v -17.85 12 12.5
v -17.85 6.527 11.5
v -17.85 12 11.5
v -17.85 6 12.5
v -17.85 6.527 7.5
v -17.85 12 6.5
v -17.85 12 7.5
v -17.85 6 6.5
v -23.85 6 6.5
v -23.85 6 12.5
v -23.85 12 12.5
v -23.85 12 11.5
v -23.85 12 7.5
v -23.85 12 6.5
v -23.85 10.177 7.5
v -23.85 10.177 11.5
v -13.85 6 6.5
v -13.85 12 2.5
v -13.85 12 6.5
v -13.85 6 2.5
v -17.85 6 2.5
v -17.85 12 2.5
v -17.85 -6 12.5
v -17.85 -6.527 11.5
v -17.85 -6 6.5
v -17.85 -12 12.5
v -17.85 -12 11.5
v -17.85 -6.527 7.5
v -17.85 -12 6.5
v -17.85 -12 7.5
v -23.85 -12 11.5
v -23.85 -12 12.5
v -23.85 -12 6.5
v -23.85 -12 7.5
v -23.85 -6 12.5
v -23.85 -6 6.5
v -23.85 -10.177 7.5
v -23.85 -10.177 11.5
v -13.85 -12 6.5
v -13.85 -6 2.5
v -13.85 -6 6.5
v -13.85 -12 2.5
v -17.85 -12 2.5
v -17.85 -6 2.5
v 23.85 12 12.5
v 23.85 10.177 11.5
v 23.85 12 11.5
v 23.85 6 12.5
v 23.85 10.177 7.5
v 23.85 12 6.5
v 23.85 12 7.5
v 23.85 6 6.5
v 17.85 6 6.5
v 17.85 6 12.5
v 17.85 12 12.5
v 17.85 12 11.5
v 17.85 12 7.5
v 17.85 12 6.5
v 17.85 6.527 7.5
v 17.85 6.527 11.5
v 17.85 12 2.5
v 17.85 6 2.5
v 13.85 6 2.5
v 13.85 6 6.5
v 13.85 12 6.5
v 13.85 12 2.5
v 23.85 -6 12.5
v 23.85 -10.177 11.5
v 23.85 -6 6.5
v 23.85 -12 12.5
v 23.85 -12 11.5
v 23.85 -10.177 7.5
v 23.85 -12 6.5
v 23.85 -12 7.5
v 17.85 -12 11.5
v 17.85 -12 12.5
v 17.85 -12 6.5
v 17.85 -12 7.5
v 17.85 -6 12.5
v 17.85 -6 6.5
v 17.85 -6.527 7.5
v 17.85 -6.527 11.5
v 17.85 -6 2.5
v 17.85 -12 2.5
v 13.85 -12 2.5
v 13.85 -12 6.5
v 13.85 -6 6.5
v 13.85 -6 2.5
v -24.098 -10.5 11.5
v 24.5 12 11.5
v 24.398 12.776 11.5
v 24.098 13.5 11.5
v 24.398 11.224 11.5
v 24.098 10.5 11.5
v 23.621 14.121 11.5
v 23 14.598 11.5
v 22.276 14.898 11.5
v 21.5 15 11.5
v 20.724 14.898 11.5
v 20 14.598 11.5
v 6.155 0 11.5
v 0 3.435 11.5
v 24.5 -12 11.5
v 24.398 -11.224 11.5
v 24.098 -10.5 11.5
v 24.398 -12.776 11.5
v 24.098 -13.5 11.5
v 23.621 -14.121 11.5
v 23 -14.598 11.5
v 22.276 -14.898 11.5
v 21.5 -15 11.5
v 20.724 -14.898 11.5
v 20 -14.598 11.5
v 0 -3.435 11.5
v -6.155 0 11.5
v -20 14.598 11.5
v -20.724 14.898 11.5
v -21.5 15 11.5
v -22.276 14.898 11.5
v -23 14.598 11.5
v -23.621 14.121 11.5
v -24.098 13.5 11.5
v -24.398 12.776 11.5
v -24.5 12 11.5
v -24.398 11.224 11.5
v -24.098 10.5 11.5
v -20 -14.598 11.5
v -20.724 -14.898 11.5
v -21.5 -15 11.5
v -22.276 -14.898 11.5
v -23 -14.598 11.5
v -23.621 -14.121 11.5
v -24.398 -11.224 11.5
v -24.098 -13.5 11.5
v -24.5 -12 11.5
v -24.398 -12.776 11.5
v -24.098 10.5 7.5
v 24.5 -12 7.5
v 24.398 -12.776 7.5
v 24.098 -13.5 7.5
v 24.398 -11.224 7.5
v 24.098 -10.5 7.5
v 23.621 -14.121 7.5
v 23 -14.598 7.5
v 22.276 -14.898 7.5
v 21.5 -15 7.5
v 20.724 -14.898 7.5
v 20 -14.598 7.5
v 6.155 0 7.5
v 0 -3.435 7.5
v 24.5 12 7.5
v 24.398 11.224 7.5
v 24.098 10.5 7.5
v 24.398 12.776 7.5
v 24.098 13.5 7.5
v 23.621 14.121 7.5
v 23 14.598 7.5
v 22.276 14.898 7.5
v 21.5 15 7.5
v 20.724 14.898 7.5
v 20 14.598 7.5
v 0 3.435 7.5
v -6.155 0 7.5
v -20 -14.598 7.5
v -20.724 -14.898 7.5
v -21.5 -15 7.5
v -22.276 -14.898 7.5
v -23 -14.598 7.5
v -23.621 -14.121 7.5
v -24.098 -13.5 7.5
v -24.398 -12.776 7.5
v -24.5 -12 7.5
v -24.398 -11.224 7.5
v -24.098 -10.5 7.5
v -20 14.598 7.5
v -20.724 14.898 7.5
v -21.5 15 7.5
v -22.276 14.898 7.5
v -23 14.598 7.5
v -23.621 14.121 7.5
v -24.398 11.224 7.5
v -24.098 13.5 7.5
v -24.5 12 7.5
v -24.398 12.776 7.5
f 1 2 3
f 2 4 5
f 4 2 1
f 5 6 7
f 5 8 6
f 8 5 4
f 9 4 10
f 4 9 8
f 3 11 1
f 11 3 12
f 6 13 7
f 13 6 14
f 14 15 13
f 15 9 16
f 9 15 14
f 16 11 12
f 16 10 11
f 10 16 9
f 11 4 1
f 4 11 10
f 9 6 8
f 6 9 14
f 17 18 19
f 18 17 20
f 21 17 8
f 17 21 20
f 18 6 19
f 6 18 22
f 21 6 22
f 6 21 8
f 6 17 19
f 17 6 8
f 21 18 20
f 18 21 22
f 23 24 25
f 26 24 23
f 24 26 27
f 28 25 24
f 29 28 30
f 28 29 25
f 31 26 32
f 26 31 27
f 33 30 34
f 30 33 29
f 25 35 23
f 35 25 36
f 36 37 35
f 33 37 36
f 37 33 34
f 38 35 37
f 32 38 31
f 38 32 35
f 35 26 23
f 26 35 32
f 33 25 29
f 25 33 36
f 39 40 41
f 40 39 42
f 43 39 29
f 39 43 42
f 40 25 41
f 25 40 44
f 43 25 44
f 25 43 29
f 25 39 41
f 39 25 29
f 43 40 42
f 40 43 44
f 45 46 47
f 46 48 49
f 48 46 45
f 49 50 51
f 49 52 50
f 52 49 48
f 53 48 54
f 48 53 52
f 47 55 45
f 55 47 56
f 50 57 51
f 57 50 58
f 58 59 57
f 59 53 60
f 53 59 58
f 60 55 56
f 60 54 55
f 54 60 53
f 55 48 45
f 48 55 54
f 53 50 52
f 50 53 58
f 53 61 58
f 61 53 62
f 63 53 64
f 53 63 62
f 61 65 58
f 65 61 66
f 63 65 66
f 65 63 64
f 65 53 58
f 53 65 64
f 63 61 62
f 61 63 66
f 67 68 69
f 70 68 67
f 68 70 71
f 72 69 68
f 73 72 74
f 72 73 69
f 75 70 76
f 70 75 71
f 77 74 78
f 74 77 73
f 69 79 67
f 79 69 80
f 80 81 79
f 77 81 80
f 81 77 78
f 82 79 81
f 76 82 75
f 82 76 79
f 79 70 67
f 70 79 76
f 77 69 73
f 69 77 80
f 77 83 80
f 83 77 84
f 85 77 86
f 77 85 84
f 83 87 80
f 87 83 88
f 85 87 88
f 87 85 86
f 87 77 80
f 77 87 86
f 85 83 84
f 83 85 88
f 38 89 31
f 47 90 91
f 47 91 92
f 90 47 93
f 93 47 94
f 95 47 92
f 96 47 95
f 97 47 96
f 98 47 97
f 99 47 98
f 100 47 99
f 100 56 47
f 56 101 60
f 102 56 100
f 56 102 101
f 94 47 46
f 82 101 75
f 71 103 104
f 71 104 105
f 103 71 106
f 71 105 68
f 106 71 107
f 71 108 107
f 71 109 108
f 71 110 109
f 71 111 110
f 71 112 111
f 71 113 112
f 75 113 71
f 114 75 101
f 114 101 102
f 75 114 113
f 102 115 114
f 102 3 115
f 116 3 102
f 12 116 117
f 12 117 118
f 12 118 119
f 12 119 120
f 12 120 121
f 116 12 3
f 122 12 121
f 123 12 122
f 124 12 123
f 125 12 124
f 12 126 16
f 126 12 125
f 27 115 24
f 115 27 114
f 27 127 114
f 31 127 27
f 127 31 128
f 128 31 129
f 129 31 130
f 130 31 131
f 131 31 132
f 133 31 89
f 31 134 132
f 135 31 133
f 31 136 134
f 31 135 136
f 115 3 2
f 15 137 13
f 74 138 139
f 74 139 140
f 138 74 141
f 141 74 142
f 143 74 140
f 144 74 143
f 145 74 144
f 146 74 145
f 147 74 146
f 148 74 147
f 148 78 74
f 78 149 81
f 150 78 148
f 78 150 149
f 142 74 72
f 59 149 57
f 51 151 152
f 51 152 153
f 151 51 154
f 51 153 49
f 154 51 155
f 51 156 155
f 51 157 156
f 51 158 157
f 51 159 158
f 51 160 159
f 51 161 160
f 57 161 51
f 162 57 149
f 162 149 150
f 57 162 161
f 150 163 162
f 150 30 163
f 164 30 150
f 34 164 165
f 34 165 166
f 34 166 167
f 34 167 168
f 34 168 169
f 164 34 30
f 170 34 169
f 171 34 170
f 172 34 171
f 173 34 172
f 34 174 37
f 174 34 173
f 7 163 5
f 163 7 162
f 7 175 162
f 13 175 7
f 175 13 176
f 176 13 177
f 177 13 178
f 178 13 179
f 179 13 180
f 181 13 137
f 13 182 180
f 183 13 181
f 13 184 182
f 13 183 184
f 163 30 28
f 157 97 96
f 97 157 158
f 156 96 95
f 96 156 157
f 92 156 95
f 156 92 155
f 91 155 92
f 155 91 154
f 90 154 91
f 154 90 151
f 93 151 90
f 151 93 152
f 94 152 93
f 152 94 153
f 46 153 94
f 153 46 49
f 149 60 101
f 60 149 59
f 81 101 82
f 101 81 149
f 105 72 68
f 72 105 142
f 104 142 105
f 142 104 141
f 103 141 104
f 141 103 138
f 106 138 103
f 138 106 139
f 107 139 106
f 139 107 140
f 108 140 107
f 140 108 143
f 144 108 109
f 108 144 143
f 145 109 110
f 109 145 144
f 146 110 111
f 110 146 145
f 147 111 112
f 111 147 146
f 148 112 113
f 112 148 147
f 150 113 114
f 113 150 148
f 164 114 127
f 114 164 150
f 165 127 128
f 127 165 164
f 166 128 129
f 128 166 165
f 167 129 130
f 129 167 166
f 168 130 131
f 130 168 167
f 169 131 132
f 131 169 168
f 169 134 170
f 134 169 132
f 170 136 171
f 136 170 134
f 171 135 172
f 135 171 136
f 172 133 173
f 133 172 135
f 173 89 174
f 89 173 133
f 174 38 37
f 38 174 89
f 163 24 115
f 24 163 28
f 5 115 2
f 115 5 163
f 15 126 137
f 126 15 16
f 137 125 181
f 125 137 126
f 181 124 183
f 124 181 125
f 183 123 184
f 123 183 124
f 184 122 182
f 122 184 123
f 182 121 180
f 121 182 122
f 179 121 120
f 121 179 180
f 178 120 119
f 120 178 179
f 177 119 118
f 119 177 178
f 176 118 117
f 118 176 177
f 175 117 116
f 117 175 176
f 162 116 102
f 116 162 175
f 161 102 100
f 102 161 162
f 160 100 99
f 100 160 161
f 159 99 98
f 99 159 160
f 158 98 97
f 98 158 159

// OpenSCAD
// HUB75 display case component: din_rail_cable_clip
include <../config/project_config.scad>

module din_rail_cable_clip_x() {
    buiten_x = din_width/2 + din_clip_clearance;
    top_y = din_height + ribbon_cable_thickness + ribbon_cable_clearance + 2.0;

    color(color_bracket)
    union() {
        // Two diagonal arms in the X-Z plane.
        // Together they form a simple X above the ribbon cable.
        translate([0,top_y,0])
        rotate([90,0,0])
        linear_extrude(height=xclip_thickness)
        union() {
            hull() {
                translate([-xclip_width/2,-xclip_height/2]) circle(d=xclip_arm_width,$fn=24);
                translate([ xclip_width/2, xclip_height/2]) circle(d=xclip_arm_width,$fn=24);
            }
            hull() {
                translate([-xclip_width/2, xclip_height/2]) circle(d=xclip_arm_width,$fn=24);
                translate([ xclip_width/2,-xclip_height/2]) circle(d=xclip_arm_width,$fn=24);
            }
        }

        // Four vertical legs: left/right and top/bottom in Z.
        for(sx=[-1,1])
            for(sz=[-1,1]) {
                x0 = sx*(buiten_x + xclip_arm_width/2);
                z0 = sz*(xclip_height/2 - xclip_arm_width/2);

                // Leg along the rail side
                translate([
                    x0 - xclip_arm_width/2,
                    din_height-din_thickness,
                    z0-xclip_arm_width/2
                ])
                    cube([
                        xclip_arm_width,
                        ribbon_cable_thickness+ribbon_cable_clearance+xclip_thickness,
                        xclip_arm_width
                    ]);

                // Hook below the outer lip
                translate([
                    sx > 0 ? buiten_x-xclip_hook_depth : -buiten_x,
                    din_height-din_thickness-xclip_hook_height,
                    z0-xclip_arm_width/2
                ])
                    cube([
                        xclip_hook_depth,
                        xclip_hook_height,
                        xclip_arm_width
                    ]);
            }
    }
}

/* [Standalone preview] */
rotate([90,0,0]) din_rail_cable_clip_x();
